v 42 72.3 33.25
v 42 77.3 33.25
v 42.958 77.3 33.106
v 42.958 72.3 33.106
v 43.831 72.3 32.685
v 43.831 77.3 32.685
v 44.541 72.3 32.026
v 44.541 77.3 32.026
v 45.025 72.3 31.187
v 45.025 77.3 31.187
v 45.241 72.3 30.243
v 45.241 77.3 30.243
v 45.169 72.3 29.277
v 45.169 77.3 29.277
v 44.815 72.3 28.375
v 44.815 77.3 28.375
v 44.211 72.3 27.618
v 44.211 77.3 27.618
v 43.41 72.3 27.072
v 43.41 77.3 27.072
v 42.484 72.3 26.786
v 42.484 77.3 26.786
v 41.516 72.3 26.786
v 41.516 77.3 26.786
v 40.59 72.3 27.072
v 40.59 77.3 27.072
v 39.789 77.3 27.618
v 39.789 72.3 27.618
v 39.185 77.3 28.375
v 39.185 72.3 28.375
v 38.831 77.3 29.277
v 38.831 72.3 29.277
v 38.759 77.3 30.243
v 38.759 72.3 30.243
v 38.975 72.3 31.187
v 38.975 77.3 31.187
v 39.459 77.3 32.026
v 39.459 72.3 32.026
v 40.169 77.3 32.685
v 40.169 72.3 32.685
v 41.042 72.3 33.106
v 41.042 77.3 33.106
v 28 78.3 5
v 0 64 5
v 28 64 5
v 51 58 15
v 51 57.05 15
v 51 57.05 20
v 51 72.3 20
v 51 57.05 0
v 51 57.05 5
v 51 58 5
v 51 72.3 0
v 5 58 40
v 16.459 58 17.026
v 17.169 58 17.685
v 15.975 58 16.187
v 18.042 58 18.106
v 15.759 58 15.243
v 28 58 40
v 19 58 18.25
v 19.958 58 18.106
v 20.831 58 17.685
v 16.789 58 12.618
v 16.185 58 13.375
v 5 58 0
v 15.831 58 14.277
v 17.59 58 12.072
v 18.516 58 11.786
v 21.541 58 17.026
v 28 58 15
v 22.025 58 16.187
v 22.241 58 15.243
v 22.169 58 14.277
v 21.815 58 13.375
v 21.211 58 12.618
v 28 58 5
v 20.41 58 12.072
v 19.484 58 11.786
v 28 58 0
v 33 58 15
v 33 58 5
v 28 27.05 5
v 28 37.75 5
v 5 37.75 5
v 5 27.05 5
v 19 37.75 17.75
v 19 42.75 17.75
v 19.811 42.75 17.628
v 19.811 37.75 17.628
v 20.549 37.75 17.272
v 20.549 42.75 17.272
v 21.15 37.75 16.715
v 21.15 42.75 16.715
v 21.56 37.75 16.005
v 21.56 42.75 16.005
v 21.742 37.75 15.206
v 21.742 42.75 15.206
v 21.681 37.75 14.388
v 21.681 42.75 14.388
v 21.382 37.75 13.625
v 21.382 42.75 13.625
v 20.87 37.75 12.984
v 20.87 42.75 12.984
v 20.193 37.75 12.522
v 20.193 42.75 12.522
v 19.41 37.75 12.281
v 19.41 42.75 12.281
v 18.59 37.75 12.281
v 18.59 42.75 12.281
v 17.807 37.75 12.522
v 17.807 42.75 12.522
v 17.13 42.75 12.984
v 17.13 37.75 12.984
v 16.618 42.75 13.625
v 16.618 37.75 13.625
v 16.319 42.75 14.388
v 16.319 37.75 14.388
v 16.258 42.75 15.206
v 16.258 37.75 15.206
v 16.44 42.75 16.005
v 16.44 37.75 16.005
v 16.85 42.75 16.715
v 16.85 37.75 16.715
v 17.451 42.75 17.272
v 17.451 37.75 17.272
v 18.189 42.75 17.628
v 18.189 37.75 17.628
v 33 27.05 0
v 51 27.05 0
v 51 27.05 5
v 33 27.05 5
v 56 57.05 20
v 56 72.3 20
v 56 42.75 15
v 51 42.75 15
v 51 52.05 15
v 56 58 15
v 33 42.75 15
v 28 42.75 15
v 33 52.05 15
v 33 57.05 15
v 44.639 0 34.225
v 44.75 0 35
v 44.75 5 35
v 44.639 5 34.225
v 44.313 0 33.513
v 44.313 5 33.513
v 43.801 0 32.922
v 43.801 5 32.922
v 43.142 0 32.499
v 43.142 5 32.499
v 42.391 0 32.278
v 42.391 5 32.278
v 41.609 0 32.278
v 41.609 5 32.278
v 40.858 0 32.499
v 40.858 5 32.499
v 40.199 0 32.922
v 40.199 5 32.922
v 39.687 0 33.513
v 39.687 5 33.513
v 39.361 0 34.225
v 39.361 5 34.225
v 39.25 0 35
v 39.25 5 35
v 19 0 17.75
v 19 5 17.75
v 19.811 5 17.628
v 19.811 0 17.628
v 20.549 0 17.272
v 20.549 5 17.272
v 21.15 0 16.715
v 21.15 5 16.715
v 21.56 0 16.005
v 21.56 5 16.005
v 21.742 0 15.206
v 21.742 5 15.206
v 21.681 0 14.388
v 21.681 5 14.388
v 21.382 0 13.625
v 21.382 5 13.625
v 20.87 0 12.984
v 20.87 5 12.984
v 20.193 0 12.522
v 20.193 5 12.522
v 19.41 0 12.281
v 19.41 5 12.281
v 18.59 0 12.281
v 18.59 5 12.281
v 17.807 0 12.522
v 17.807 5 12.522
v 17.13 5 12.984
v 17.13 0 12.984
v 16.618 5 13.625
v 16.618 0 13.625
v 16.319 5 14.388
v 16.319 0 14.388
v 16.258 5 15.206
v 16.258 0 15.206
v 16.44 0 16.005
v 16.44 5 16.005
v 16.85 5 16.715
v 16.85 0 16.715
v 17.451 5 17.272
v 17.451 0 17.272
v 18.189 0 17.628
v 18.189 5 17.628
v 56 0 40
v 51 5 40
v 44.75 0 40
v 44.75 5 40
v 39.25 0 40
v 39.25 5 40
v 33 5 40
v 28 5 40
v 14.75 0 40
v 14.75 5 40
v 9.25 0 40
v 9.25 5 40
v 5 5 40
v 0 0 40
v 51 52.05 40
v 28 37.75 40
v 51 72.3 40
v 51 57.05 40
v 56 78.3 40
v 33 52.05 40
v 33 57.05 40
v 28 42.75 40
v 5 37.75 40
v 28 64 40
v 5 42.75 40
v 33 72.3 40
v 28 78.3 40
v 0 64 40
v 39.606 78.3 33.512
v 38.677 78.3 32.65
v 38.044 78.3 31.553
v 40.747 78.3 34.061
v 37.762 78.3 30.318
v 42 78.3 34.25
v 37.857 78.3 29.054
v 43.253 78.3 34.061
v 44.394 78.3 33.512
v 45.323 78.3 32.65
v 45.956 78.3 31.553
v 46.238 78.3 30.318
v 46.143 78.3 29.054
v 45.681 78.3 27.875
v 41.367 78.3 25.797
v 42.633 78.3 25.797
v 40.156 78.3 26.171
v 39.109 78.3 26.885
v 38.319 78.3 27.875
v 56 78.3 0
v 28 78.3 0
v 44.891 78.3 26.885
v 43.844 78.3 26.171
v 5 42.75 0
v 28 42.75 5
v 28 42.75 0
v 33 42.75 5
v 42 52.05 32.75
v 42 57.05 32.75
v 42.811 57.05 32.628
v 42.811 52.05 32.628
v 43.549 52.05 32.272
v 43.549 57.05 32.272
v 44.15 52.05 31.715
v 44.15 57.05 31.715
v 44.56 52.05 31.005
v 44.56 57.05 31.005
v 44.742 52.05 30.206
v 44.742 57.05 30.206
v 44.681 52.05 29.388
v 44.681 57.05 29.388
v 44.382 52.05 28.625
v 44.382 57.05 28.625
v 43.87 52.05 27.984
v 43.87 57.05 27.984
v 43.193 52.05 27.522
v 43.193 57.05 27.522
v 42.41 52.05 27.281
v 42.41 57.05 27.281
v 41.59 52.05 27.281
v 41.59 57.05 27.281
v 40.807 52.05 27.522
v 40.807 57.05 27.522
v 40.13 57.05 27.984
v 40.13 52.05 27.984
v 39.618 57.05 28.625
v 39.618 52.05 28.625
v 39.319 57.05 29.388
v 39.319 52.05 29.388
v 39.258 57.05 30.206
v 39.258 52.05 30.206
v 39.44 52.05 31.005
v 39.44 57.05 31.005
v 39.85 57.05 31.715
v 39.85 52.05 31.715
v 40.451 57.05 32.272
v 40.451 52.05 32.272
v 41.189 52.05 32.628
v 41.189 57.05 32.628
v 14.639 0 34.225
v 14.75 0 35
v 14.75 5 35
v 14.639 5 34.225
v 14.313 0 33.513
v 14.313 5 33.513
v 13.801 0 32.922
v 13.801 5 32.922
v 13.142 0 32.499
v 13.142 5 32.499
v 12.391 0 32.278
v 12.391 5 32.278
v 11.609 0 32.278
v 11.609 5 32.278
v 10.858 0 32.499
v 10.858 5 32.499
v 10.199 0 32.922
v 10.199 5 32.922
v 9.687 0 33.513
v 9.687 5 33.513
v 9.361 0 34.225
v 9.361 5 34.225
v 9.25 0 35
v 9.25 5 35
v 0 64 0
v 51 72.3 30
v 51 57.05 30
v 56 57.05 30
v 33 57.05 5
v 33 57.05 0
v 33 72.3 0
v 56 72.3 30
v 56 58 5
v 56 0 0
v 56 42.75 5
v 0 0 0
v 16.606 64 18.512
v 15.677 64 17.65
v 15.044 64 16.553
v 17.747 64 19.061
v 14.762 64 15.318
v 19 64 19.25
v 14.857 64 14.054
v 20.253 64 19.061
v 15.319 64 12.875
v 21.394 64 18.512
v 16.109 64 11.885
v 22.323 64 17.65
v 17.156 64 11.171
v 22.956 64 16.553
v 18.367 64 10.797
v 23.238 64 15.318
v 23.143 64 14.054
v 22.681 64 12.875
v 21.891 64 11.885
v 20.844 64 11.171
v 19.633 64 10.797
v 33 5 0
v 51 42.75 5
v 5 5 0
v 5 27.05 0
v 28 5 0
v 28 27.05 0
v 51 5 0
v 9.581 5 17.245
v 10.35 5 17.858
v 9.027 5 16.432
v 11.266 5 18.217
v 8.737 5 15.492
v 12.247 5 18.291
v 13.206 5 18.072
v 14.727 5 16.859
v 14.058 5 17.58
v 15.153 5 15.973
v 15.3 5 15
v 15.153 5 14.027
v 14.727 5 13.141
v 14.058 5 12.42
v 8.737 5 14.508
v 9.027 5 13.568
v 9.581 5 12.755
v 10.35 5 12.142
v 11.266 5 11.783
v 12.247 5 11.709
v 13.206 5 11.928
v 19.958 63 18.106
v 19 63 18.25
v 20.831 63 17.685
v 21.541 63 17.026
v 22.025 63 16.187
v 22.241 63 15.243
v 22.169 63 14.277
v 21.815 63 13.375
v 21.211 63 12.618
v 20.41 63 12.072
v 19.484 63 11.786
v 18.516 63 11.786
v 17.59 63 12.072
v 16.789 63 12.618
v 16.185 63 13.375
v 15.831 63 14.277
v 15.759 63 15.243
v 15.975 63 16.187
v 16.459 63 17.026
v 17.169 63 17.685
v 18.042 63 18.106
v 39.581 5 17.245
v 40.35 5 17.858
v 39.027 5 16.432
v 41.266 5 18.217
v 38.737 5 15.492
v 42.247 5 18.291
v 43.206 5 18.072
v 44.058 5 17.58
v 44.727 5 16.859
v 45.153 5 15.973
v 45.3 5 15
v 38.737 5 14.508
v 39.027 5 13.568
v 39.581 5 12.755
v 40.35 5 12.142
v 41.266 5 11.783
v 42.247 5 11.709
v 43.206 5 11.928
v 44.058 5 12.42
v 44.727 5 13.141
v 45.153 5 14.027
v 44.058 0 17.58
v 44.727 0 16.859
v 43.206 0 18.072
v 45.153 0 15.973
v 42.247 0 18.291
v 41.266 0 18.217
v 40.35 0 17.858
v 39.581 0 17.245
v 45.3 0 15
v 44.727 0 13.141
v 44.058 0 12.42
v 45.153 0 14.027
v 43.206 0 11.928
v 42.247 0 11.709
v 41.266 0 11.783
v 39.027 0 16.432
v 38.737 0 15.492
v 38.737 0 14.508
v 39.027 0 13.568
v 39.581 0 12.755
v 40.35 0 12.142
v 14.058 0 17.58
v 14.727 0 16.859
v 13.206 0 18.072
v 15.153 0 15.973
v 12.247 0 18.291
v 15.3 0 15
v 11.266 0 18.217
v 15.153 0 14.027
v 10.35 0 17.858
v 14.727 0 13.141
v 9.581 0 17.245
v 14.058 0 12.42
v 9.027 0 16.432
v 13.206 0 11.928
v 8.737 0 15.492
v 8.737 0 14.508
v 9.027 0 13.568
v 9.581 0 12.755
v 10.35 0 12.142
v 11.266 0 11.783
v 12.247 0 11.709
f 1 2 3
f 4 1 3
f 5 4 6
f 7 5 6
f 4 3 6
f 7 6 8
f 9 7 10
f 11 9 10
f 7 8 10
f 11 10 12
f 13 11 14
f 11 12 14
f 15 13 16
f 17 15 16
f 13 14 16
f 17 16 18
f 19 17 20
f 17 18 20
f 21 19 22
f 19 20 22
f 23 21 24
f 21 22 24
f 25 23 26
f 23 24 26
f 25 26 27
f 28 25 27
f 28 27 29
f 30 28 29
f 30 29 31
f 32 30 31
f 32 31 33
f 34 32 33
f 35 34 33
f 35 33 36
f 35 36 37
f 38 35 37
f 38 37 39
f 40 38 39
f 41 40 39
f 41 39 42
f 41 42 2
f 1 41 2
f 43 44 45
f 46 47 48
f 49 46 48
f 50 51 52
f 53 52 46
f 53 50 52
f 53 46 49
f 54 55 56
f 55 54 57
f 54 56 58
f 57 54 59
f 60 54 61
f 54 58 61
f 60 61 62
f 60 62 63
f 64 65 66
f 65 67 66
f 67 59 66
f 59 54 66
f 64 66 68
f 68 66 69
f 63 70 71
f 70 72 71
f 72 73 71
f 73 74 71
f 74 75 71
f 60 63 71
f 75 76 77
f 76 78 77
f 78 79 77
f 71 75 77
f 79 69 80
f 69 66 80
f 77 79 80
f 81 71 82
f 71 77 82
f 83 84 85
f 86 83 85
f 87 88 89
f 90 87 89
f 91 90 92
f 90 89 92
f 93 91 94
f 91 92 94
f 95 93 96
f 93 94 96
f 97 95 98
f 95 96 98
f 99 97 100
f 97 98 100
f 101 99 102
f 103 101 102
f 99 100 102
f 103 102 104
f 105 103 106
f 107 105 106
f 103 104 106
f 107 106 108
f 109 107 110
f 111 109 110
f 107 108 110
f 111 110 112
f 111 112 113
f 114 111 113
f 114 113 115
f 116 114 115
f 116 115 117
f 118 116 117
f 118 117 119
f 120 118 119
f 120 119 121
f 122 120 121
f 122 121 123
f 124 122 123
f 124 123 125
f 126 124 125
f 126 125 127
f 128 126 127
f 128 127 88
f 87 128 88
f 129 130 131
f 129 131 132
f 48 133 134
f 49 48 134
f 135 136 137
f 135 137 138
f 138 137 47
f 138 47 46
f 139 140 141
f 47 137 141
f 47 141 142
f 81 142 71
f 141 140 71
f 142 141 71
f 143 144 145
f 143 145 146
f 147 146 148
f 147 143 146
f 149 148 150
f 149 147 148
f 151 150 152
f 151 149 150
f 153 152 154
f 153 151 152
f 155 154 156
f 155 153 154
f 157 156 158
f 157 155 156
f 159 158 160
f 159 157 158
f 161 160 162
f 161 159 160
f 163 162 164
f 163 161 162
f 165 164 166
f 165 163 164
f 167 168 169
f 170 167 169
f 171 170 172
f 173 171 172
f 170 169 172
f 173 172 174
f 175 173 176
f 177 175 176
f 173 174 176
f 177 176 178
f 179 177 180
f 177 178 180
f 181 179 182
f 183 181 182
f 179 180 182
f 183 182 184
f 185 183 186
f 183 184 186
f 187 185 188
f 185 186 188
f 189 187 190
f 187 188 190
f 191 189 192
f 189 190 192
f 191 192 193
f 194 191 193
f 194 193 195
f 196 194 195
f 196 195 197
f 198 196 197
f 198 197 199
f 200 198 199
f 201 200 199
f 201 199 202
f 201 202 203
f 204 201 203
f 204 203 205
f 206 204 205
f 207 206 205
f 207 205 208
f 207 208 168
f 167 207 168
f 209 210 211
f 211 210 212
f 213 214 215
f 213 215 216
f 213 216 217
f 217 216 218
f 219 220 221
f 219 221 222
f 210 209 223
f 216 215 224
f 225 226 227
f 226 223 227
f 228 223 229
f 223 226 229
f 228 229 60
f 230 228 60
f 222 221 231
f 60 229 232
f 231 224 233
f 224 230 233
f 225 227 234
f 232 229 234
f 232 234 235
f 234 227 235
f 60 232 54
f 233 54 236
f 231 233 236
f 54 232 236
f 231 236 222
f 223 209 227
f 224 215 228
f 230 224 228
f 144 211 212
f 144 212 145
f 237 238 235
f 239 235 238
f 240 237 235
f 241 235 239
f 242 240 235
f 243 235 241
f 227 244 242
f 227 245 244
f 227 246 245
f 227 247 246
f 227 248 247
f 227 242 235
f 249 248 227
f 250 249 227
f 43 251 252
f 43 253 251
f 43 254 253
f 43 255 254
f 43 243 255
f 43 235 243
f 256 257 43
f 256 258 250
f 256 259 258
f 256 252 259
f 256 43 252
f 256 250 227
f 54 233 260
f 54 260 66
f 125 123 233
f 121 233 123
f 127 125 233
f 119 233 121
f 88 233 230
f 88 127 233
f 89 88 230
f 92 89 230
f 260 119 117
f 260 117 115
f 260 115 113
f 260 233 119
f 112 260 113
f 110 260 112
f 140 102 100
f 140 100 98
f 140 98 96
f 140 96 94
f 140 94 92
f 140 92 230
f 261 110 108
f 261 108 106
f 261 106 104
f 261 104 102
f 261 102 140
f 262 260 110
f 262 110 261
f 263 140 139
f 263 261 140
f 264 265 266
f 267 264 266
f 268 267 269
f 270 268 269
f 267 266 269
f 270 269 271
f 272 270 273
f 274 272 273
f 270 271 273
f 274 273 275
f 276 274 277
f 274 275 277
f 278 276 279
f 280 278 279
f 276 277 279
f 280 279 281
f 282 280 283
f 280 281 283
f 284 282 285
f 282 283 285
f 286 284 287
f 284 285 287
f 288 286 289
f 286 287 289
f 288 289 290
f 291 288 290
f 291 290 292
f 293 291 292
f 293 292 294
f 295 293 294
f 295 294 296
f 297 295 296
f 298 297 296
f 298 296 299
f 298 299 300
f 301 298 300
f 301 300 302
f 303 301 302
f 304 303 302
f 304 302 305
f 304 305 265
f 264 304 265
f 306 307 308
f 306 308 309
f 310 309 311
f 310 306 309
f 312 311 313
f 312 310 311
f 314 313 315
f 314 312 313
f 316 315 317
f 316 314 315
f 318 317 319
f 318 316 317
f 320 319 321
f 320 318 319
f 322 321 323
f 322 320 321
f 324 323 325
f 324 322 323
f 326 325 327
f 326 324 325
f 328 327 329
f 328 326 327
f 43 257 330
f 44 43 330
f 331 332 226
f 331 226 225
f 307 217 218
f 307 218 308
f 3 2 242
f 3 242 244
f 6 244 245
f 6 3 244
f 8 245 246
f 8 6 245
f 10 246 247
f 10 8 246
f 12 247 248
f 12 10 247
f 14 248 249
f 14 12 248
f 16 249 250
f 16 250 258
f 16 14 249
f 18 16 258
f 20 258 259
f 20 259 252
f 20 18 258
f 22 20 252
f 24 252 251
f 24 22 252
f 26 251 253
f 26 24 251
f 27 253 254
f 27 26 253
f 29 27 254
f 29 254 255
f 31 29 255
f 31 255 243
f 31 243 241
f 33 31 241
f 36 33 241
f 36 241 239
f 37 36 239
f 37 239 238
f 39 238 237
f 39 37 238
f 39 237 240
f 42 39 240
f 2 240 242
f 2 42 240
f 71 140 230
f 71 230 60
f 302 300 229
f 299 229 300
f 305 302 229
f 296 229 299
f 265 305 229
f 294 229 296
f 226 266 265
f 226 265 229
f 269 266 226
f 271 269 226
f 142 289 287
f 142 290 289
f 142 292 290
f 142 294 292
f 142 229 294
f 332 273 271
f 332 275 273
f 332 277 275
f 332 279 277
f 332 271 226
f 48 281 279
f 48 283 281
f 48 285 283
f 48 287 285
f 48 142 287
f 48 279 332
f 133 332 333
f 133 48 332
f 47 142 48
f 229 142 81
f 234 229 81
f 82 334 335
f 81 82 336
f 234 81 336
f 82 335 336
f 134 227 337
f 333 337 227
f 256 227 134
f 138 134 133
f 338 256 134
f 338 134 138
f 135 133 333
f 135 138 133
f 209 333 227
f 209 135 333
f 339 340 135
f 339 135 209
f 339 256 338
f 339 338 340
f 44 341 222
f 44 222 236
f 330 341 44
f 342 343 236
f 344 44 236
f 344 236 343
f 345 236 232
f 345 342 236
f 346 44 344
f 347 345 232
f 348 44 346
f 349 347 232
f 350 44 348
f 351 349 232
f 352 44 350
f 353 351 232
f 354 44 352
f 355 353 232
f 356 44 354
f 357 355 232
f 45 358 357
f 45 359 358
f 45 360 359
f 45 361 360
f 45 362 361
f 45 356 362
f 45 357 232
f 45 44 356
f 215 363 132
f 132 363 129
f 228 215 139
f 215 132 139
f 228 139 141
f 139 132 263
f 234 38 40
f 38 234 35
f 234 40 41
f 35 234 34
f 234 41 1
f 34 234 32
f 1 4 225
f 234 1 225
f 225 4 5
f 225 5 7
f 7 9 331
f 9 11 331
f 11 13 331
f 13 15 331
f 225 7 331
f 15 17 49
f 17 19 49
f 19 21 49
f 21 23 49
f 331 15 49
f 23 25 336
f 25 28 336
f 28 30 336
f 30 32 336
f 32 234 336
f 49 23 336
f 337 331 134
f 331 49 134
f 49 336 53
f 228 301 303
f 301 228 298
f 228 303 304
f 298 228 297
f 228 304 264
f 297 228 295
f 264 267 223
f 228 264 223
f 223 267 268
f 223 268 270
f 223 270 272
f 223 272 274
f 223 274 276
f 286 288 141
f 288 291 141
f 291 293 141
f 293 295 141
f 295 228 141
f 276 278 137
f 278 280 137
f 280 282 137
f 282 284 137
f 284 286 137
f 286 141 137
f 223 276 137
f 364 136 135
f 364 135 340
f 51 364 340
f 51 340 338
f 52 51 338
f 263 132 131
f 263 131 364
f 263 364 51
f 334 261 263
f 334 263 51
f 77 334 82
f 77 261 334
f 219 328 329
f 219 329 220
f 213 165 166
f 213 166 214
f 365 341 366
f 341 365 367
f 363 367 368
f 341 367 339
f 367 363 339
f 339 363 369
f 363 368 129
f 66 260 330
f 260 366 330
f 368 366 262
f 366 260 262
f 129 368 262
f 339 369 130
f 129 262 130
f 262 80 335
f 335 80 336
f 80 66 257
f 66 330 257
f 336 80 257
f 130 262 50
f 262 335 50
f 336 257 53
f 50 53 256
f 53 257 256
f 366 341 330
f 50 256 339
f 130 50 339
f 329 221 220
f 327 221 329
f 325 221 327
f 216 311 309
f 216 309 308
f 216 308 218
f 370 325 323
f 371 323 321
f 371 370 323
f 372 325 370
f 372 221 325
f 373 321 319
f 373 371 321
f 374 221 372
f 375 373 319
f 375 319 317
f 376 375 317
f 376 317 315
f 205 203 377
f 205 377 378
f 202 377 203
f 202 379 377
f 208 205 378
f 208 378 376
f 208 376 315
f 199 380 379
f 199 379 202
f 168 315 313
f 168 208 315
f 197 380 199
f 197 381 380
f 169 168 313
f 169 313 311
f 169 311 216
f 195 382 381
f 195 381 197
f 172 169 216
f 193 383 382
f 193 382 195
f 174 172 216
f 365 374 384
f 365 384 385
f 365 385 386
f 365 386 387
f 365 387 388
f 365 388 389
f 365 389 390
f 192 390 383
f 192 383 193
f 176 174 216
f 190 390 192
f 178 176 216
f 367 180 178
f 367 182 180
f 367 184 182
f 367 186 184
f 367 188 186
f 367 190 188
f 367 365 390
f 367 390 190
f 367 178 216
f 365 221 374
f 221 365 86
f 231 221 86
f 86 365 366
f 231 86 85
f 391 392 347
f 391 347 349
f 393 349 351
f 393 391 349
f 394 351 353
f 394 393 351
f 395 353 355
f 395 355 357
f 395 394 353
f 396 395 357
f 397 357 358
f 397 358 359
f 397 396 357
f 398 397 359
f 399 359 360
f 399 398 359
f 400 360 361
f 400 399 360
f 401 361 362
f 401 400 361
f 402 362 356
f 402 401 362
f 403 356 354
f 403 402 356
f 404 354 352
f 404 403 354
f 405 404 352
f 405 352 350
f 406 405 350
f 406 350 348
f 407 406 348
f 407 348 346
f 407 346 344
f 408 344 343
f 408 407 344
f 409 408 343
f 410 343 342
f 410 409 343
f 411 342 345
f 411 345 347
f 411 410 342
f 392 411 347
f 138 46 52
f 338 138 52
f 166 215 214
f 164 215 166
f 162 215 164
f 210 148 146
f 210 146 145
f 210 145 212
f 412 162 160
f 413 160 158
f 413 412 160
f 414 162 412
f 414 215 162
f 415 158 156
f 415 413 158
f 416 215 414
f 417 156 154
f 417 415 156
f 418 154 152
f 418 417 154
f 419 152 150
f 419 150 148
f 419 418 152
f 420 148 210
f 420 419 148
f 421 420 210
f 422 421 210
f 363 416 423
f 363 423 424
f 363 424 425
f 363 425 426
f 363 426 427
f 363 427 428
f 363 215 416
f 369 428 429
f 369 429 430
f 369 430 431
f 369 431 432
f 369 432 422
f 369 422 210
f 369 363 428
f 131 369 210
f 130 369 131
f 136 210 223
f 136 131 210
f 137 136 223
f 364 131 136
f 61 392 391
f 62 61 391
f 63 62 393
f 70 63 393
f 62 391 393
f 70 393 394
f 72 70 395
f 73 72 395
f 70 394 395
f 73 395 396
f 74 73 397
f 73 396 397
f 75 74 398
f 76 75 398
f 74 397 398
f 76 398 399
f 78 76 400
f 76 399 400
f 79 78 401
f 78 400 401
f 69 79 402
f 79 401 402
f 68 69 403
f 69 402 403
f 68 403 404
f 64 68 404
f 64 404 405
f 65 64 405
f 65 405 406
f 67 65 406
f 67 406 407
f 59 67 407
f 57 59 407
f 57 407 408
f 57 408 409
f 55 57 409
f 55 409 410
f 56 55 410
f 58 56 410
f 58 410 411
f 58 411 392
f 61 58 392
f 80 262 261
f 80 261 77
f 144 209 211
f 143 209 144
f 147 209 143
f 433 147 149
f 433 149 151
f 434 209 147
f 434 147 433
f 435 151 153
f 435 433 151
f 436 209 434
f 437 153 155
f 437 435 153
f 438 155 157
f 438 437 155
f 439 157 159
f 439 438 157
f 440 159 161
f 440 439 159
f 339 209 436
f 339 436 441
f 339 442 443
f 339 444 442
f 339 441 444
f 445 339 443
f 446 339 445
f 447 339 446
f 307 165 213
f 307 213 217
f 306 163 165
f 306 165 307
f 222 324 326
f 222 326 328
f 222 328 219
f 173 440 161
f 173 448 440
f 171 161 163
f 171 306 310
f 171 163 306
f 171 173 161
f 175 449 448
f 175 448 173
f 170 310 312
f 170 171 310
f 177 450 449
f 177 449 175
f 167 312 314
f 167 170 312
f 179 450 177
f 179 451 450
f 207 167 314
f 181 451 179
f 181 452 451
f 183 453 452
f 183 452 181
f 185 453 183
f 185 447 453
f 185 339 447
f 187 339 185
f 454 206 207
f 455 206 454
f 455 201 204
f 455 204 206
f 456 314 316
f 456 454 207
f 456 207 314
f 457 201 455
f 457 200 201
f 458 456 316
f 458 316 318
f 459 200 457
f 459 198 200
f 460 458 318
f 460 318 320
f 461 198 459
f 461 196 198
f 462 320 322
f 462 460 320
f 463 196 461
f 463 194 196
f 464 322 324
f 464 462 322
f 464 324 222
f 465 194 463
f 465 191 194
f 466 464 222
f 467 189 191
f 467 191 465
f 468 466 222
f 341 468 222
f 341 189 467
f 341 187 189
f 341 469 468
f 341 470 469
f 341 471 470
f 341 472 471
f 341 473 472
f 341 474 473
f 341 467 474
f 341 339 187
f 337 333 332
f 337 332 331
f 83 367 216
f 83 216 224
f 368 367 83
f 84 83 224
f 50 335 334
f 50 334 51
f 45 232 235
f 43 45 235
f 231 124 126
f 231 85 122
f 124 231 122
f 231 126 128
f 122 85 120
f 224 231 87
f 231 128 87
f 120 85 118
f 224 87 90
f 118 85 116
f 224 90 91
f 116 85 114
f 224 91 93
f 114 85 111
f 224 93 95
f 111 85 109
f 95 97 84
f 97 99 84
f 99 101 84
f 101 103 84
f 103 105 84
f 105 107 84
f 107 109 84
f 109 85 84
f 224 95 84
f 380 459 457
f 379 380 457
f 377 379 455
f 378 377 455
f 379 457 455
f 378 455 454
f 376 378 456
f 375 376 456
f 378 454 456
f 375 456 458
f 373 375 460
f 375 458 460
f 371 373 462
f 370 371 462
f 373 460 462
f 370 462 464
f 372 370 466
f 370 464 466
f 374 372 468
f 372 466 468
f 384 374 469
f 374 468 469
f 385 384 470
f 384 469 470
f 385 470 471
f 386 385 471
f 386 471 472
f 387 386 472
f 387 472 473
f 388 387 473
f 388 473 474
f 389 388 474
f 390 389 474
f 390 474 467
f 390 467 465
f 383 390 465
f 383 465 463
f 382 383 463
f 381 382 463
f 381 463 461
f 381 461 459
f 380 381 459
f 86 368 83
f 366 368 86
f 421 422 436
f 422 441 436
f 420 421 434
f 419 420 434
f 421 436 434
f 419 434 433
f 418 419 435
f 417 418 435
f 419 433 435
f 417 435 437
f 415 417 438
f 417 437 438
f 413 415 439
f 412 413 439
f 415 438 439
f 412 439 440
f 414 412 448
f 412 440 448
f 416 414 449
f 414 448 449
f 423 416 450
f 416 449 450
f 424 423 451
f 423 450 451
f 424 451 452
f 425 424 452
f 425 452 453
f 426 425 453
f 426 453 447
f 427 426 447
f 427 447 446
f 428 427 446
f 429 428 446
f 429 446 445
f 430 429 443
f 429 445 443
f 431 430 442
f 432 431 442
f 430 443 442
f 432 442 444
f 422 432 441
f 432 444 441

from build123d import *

# Parameters (mm, degrees)
SKETCH1_W           = 23
SKETCH1_H           = 32.75
SKETCH1_W_2         = 18
SKETCH1_H_2         = 15.25
SKETCH1_H_3         = 47.05
BOSS_EXTRUDE1_DEPTH = 40
CUT_EXTRUDE1_REACH  = 106.244
SKETCH2_R           = 2.75
CUT_EXTRUDE2_REACH  = 106.244
SKETCH3_W           = 10
SKETCH3_H           = 15.25
SKETCH4_W           = 10
SKETCH4_H           = 15.25
CUT_EXTRUDE3_DEPTH  = 102.645904984
CUT_EXTRUDE4_REACH  = 106.244
SKETCH6_R           = 3.25
CHAMFER1_SIZE       = 1
CUT_EXTRUDE5_REACH  = 106.244
SKETCH7_R           = 3.3
SKETCH9_R           = 2.75
CUT_EXTRUDE6_DEPTH  = 101.542975886
SKETCH10_W          = 18
SKETCH10_H          = 25
SKETCH10_W_2        = 23
SKETCH10_H_2        = 10.7
BOSS_EXTRUDE2_DEPTH = 5


with BuildPart() as part:
    # Sketch1 → Boss-Extrude1 (new body)
    with BuildSketch(Plane.XY):
        Polygon((0, 0), (0, 64), (28, 64), (28, 78.3), (56, 78.3), (56, 0), align=None)
        with Locations((16.5, 21.375)):
            Rectangle(SKETCH1_W, SKETCH1_H, mode=Mode.SUBTRACT)
        with Locations((42, 64.675)):
            Rectangle(SKETCH1_W_2, SKETCH1_H_2, mode=Mode.SUBTRACT)
        with Locations((16.5, 50.375)):
            Rectangle(SKETCH1_W, SKETCH1_H_2, mode=Mode.SUBTRACT)
        with Locations((42, 28.525)):
            Rectangle(SKETCH1_W_2, SKETCH1_H_3, mode=Mode.SUBTRACT)
    extrude(amount=BOSS_EXTRUDE1_DEPTH)

    # Cut-Extrude1: up to this face of the body (flat: up to its plane)
    cut_extrude1_end = Plane(part.part.faces().sort_by_distance((16.5, 37.75, 20))[0])
    # Sketch2 → Cut-Extrude1 (cut, up to the picked face)
    with BuildSketch(Plane(origin=(0, 78.3, 0), x_dir=(1, 0, 0), z_dir=(0, 1, 0)), mode=Mode.PRIVATE) as cut_extrude1_sk1:
        with Locations(Location((19, -15, 0), (0, 0, 270))):
            Circle(SKETCH2_R)
    cut_extrude1_tool1 = split(extrude(cut_extrude1_sk1.sketch, amount=-CUT_EXTRUDE1_REACH, mode=Mode.PRIVATE), bisect_by=cut_extrude1_end, keep=Keep.BOTH, mode=Mode.PRIVATE)
    # Sketch2 → Cut-Extrude1 (cut, up to the picked face)
    with BuildSketch(Plane(origin=(0, 78.3, 0), x_dir=(1, 0, 0), z_dir=(0, 1, 0)), mode=Mode.PRIVATE) as cut_extrude1_sk2:
        with Locations(Location((42, -30, 0), (0, 0, 270))):
            Circle(SKETCH2_R)
    cut_extrude1_tool2 = split(extrude(cut_extrude1_sk2.sketch, amount=-CUT_EXTRUDE1_REACH, mode=Mode.PRIVATE), bisect_by=cut_extrude1_end, keep=Keep.BOTH, mode=Mode.PRIVATE)
    add(cut_extrude1_tool1.solids().sort_by(Axis((19, 78.3, 15), (0, -1, 0)))[0], mode=Mode.SUBTRACT)
    add(cut_extrude1_tool2.solids().sort_by(Axis((42, 78.3, 30), (0, -1, 0)))[0], mode=Mode.SUBTRACT)

    # Sketch3 → Cut-Extrude2 (cut, up to next)
    with BuildSketch(Plane(origin=(56, 0, 0), x_dir=(0, 0, -1), z_dir=(1, 0, 0)), mode=Mode.PRIVATE) as cut_extrude2_sk1:
        with Locations((-25, 64.675)):
            Rectangle(SKETCH3_W, SKETCH3_H)
    cut_extrude2_tool1 = extrude(cut_extrude2_sk1.sketch, amount=-CUT_EXTRUDE2_REACH, mode=Mode.PRIVATE) & part.part
    add(cut_extrude2_tool1.solids().sort_by_distance((56, 64.675, 25))[0], mode=Mode.SUBTRACT)

    # Sketch4 → Cut-Extrude3 (cut, through all)
    with BuildSketch(Plane(origin=(5, 0, 0), x_dir=(0, 0, -1), z_dir=(1, 0, 0))):
        with Locations((-10, 50.375)):
            Rectangle(SKETCH4_W, SKETCH4_H)
    extrude(amount=CUT_EXTRUDE3_DEPTH, mode=Mode.SUBTRACT)

    # Sketch6 → Cut-Extrude4 (cut, up to next)
    with BuildSketch(Plane(origin=(0, 78.3, 0), x_dir=(1, 0, 0), z_dir=(0, 1, 0)), mode=Mode.PRIVATE) as cut_extrude4_sk1:
        with Locations(Location((19, -15, 0), (0, 0, 270))):
            Circle(SKETCH6_R)
    cut_extrude4_tool1 = extrude(cut_extrude4_sk1.sketch, amount=-CUT_EXTRUDE4_REACH, mode=Mode.PRIVATE) & part.part
    # Sketch6 → Cut-Extrude4 (cut, up to next)
    with BuildSketch(Plane(origin=(0, 78.3, 0), x_dir=(1, 0, 0), z_dir=(0, 1, 0)), mode=Mode.PRIVATE) as cut_extrude4_sk2:
        with Locations(Location((42, -30, 0), (0, 0, 270))):
            Circle(SKETCH6_R)
    cut_extrude4_tool2 = extrude(cut_extrude4_sk2.sketch, amount=-CUT_EXTRUDE4_REACH, mode=Mode.PRIVATE) & part.part
    add(cut_extrude4_tool1.solids().sort_by_distance((19, 78.3, 15))[0], mode=Mode.SUBTRACT)
    add(cut_extrude4_tool2.solids().sort_by_distance((42, 78.3, 30))[0], mode=Mode.SUBTRACT)

    # Chamfer1
    chamfer1_edges = [part.edges().sort_by_distance(p)[0] for p in [
        (19, 64, 11.75),
        (42, 78.3, 26.75),
    ]]
    chamfer(chamfer1_edges, length=CHAMFER1_SIZE)

    # Sketch7 → Cut-Extrude5 (cut, up to next)
    with BuildSketch(Plane.XZ, mode=Mode.PRIVATE) as cut_extrude5_sk1:
        with Locations((12, 15)):
            Circle(SKETCH7_R)
    cut_extrude5_tool1 = extrude(cut_extrude5_sk1.sketch, amount=-CUT_EXTRUDE5_REACH, mode=Mode.PRIVATE) & part.part
    # Sketch7 → Cut-Extrude5 (cut, up to next)
    with BuildSketch(Plane.XZ, mode=Mode.PRIVATE) as cut_extrude5_sk2:
        with Locations((42, 15)):
            Circle(SKETCH7_R)
    cut_extrude5_tool2 = extrude(cut_extrude5_sk2.sketch, amount=-CUT_EXTRUDE5_REACH, mode=Mode.PRIVATE) & part.part
    # Sketch7 → Cut-Extrude5 (cut, up to next)
    with BuildSketch(Plane.XZ, mode=Mode.PRIVATE) as cut_extrude5_sk3:
        with BuildLine():
            Line((9.25, 35), (9.25, 40))
            Line((9.25, 40), (14.75, 40))
            Line((14.75, 40), (14.75, 35))
            ThreePointArc((14.75, 35), (12, 32.25), (9.25, 35))
        make_face()
    cut_extrude5_tool3 = extrude(cut_extrude5_sk3.sketch, amount=-CUT_EXTRUDE5_REACH, mode=Mode.PRIVATE) & part.part
    # Sketch7 → Cut-Extrude5 (cut, up to next)
    with BuildSketch(Plane.XZ, mode=Mode.PRIVATE) as cut_extrude5_sk4:
        with BuildLine():
            Line((39.25, 35), (39.25, 40))
            Line((39.25, 40), (44.75, 40))
            Line((44.75, 40), (44.75, 35))
            ThreePointArc((44.75, 35), (42, 32.25), (39.25, 35))
        make_face()
    cut_extrude5_tool4 = extrude(cut_extrude5_sk4.sketch, amount=-CUT_EXTRUDE5_REACH, mode=Mode.PRIVATE) & part.part
    add(cut_extrude5_tool1.solids().sort_by_distance((12, 0, 15))[0], mode=Mode.SUBTRACT)
    add(cut_extrude5_tool2.solids().sort_by_distance((42, 0, 15))[0], mode=Mode.SUBTRACT)
    add(cut_extrude5_tool3.solids().sort_by_distance((12, 0, 36.393769))[0], mode=Mode.SUBTRACT)
    add(cut_extrude5_tool4.solids().sort_by_distance((42, 0, 36.393769))[0], mode=Mode.SUBTRACT)

    # Sketch9 → Cut-Extrude6 (cut, through all)
    with BuildSketch(Plane(origin=(0, 5, 0), x_dir=(1, 0, 0), z_dir=(0, 1, 0))):
        with Locations(Location((19, -15, 0), (0, 0, 270))):
            Circle(SKETCH9_R)
    extrude(amount=-CUT_EXTRUDE6_DEPTH, mode=Mode.SUBTRACT)

    # Sketch10 → Boss-Extrude2 (add)
    with BuildSketch(Plane(origin=(0, 0, 0), x_dir=(-1, 0, 0), z_dir=(0, 0, -1))):
        Polygon((-28, 78.3), (0, 64), (-28, 64), align=None)
        with Locations((-42, 39.55)):
            Rectangle(SKETCH10_W, SKETCH10_H)
        with Locations((-16.5, 32.4)):
            Rectangle(SKETCH10_W_2, SKETCH10_H_2)
    extrude(amount=-BOSS_EXTRUDE2_DEPTH)


solid = part.part
